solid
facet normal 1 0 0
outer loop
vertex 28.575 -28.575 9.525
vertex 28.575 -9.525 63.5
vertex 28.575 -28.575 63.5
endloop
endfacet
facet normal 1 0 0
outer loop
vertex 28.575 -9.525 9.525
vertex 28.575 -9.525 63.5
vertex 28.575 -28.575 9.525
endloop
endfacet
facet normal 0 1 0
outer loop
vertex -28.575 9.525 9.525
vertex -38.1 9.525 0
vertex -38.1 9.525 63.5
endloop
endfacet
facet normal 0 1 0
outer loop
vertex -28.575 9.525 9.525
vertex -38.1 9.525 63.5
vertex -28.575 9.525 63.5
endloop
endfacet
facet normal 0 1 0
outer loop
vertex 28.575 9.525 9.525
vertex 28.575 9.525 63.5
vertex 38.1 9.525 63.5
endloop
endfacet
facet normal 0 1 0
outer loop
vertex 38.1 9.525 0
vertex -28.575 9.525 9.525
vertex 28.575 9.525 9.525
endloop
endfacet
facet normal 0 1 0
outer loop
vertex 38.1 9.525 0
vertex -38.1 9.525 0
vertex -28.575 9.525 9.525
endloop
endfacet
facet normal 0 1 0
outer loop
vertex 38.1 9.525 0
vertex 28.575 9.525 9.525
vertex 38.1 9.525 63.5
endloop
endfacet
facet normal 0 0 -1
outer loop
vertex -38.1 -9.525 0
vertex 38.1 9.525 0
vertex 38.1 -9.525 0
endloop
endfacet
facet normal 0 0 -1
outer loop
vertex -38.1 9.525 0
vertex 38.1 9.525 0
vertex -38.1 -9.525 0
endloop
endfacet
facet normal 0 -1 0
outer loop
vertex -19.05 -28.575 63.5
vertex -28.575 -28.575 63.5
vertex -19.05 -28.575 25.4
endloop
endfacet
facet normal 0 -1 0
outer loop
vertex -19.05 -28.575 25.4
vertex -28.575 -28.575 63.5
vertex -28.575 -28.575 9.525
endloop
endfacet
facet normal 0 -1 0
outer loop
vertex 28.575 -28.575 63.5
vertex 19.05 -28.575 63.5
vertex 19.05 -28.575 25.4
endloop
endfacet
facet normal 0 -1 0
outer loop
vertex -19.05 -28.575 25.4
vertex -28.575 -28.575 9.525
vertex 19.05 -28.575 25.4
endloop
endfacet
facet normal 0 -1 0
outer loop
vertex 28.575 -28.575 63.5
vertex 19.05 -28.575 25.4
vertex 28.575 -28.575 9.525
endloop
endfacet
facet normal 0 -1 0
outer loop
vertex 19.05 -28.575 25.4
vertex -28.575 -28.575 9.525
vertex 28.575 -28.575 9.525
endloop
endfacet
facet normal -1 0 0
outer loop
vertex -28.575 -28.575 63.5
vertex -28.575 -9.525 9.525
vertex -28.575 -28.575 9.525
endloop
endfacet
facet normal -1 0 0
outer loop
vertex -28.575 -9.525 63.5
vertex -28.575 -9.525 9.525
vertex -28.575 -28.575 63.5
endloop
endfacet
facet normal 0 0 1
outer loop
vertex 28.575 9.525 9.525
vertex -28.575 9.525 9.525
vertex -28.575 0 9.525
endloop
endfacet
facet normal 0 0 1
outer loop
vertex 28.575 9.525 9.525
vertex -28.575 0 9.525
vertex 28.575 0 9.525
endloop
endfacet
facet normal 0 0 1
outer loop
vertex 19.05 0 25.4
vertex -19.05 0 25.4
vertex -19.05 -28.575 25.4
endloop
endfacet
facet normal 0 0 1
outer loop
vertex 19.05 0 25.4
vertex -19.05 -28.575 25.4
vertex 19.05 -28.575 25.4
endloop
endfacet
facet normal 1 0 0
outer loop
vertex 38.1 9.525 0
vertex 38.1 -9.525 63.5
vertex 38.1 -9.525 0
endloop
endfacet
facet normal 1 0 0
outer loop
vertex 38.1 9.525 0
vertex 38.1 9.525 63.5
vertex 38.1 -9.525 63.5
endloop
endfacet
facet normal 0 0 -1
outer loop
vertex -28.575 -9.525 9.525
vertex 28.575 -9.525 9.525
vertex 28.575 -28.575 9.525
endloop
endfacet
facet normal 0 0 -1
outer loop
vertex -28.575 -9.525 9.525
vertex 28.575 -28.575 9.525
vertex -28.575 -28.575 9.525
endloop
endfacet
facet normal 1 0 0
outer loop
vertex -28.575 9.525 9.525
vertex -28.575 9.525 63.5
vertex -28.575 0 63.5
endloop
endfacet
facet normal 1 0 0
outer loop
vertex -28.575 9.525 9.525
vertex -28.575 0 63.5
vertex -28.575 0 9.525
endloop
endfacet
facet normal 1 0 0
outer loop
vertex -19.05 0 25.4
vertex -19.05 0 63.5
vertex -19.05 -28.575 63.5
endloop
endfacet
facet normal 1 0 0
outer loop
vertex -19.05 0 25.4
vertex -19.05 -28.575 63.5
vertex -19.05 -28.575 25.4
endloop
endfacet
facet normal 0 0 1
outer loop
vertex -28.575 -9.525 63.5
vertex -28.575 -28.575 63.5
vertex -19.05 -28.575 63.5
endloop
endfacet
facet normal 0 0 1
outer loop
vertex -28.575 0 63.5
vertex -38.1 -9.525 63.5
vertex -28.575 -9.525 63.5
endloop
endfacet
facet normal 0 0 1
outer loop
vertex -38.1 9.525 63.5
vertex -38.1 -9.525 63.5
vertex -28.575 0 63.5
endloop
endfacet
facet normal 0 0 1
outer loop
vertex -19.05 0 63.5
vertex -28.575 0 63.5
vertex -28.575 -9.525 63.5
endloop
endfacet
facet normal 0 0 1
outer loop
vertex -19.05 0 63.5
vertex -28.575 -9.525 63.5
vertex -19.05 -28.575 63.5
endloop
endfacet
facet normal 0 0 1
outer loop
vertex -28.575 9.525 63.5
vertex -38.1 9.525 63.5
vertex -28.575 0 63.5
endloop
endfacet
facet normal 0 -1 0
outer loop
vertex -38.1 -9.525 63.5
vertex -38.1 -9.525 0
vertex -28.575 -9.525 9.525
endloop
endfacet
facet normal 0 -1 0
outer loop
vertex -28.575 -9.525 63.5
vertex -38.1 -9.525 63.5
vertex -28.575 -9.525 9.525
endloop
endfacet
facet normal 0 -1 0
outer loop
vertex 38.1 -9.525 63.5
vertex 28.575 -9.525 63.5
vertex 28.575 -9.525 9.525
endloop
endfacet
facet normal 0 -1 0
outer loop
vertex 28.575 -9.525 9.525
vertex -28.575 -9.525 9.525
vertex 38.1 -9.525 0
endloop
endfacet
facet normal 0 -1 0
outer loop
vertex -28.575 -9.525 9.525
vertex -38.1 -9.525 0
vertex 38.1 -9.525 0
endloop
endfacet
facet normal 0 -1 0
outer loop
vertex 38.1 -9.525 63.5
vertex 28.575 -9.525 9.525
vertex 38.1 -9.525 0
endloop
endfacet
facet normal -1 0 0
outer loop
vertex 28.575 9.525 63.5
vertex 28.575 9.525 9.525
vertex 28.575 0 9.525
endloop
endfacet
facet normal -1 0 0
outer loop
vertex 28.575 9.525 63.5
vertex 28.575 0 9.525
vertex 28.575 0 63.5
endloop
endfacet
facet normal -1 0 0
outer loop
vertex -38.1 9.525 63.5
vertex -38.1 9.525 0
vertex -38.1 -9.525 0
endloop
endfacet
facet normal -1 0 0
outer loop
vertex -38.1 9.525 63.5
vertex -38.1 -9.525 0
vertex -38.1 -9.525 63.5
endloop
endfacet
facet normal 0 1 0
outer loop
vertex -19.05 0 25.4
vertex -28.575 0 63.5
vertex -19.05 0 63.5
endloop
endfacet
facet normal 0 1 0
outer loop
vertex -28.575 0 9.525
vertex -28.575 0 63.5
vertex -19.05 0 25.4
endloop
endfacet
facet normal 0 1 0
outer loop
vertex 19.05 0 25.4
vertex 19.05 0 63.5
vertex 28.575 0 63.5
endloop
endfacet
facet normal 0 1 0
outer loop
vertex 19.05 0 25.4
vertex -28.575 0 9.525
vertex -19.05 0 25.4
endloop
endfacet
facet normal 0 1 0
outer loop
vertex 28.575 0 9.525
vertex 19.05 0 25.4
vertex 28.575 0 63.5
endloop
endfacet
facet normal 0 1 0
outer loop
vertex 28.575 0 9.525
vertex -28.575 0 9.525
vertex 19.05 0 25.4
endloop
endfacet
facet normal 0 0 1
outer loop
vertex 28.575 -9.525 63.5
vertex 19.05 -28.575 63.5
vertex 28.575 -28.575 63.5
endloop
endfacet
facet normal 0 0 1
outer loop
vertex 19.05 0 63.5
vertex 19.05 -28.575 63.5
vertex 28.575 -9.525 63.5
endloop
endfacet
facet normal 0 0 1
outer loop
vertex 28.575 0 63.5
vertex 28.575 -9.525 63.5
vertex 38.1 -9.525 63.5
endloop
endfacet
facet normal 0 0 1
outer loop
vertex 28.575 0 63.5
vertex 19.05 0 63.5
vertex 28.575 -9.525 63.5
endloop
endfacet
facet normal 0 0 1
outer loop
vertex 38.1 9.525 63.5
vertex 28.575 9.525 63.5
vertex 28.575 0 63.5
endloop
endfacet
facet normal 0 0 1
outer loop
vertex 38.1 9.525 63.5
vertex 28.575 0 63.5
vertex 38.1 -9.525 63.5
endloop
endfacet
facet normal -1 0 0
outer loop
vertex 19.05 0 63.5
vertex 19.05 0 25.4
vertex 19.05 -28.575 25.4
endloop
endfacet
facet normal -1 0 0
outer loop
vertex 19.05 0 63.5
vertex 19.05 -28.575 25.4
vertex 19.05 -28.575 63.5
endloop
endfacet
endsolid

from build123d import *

# Parameters (mm, degrees)
BOSS_EXTRUDE1_DEPTH = 9.525
BOSS_EXTRUDE2_DEPTH = 28.575


with BuildPart() as part:
    # Sketch1 → Boss-Extrude1 (new, symmetric)
    with BuildSketch(Plane(origin=(0, 0, 0), x_dir=(1, 0, 0), z_dir=(0, 1, 0))):
        Polygon((38.1, 0), (-38.1, 0), (-38.1, -63.5), (-28.575, -63.5), (-28.575, -9.525), (28.575, -9.525), (28.575, -63.5), (38.1, -63.5), align=None)
    extrude(amount=BOSS_EXTRUDE1_DEPTH, both=True)

    # Sketch1<3> → Boss-Extrude2 (add)
    with BuildSketch(Plane(origin=(0, 0, 0), x_dir=(1, 0, 0), z_dir=(0, 1, 0))):
        Polygon((-28.575, -9.525), (-28.575, -63.5), (-19.05, -63.5), (-19.05, -25.4), (19.05, -25.4), (19.05, -63.5), (28.575, -63.5), (28.575, -9.525), align=None)
    extrude(amount=-BOSS_EXTRUDE2_DEPTH)


solid = part.part
